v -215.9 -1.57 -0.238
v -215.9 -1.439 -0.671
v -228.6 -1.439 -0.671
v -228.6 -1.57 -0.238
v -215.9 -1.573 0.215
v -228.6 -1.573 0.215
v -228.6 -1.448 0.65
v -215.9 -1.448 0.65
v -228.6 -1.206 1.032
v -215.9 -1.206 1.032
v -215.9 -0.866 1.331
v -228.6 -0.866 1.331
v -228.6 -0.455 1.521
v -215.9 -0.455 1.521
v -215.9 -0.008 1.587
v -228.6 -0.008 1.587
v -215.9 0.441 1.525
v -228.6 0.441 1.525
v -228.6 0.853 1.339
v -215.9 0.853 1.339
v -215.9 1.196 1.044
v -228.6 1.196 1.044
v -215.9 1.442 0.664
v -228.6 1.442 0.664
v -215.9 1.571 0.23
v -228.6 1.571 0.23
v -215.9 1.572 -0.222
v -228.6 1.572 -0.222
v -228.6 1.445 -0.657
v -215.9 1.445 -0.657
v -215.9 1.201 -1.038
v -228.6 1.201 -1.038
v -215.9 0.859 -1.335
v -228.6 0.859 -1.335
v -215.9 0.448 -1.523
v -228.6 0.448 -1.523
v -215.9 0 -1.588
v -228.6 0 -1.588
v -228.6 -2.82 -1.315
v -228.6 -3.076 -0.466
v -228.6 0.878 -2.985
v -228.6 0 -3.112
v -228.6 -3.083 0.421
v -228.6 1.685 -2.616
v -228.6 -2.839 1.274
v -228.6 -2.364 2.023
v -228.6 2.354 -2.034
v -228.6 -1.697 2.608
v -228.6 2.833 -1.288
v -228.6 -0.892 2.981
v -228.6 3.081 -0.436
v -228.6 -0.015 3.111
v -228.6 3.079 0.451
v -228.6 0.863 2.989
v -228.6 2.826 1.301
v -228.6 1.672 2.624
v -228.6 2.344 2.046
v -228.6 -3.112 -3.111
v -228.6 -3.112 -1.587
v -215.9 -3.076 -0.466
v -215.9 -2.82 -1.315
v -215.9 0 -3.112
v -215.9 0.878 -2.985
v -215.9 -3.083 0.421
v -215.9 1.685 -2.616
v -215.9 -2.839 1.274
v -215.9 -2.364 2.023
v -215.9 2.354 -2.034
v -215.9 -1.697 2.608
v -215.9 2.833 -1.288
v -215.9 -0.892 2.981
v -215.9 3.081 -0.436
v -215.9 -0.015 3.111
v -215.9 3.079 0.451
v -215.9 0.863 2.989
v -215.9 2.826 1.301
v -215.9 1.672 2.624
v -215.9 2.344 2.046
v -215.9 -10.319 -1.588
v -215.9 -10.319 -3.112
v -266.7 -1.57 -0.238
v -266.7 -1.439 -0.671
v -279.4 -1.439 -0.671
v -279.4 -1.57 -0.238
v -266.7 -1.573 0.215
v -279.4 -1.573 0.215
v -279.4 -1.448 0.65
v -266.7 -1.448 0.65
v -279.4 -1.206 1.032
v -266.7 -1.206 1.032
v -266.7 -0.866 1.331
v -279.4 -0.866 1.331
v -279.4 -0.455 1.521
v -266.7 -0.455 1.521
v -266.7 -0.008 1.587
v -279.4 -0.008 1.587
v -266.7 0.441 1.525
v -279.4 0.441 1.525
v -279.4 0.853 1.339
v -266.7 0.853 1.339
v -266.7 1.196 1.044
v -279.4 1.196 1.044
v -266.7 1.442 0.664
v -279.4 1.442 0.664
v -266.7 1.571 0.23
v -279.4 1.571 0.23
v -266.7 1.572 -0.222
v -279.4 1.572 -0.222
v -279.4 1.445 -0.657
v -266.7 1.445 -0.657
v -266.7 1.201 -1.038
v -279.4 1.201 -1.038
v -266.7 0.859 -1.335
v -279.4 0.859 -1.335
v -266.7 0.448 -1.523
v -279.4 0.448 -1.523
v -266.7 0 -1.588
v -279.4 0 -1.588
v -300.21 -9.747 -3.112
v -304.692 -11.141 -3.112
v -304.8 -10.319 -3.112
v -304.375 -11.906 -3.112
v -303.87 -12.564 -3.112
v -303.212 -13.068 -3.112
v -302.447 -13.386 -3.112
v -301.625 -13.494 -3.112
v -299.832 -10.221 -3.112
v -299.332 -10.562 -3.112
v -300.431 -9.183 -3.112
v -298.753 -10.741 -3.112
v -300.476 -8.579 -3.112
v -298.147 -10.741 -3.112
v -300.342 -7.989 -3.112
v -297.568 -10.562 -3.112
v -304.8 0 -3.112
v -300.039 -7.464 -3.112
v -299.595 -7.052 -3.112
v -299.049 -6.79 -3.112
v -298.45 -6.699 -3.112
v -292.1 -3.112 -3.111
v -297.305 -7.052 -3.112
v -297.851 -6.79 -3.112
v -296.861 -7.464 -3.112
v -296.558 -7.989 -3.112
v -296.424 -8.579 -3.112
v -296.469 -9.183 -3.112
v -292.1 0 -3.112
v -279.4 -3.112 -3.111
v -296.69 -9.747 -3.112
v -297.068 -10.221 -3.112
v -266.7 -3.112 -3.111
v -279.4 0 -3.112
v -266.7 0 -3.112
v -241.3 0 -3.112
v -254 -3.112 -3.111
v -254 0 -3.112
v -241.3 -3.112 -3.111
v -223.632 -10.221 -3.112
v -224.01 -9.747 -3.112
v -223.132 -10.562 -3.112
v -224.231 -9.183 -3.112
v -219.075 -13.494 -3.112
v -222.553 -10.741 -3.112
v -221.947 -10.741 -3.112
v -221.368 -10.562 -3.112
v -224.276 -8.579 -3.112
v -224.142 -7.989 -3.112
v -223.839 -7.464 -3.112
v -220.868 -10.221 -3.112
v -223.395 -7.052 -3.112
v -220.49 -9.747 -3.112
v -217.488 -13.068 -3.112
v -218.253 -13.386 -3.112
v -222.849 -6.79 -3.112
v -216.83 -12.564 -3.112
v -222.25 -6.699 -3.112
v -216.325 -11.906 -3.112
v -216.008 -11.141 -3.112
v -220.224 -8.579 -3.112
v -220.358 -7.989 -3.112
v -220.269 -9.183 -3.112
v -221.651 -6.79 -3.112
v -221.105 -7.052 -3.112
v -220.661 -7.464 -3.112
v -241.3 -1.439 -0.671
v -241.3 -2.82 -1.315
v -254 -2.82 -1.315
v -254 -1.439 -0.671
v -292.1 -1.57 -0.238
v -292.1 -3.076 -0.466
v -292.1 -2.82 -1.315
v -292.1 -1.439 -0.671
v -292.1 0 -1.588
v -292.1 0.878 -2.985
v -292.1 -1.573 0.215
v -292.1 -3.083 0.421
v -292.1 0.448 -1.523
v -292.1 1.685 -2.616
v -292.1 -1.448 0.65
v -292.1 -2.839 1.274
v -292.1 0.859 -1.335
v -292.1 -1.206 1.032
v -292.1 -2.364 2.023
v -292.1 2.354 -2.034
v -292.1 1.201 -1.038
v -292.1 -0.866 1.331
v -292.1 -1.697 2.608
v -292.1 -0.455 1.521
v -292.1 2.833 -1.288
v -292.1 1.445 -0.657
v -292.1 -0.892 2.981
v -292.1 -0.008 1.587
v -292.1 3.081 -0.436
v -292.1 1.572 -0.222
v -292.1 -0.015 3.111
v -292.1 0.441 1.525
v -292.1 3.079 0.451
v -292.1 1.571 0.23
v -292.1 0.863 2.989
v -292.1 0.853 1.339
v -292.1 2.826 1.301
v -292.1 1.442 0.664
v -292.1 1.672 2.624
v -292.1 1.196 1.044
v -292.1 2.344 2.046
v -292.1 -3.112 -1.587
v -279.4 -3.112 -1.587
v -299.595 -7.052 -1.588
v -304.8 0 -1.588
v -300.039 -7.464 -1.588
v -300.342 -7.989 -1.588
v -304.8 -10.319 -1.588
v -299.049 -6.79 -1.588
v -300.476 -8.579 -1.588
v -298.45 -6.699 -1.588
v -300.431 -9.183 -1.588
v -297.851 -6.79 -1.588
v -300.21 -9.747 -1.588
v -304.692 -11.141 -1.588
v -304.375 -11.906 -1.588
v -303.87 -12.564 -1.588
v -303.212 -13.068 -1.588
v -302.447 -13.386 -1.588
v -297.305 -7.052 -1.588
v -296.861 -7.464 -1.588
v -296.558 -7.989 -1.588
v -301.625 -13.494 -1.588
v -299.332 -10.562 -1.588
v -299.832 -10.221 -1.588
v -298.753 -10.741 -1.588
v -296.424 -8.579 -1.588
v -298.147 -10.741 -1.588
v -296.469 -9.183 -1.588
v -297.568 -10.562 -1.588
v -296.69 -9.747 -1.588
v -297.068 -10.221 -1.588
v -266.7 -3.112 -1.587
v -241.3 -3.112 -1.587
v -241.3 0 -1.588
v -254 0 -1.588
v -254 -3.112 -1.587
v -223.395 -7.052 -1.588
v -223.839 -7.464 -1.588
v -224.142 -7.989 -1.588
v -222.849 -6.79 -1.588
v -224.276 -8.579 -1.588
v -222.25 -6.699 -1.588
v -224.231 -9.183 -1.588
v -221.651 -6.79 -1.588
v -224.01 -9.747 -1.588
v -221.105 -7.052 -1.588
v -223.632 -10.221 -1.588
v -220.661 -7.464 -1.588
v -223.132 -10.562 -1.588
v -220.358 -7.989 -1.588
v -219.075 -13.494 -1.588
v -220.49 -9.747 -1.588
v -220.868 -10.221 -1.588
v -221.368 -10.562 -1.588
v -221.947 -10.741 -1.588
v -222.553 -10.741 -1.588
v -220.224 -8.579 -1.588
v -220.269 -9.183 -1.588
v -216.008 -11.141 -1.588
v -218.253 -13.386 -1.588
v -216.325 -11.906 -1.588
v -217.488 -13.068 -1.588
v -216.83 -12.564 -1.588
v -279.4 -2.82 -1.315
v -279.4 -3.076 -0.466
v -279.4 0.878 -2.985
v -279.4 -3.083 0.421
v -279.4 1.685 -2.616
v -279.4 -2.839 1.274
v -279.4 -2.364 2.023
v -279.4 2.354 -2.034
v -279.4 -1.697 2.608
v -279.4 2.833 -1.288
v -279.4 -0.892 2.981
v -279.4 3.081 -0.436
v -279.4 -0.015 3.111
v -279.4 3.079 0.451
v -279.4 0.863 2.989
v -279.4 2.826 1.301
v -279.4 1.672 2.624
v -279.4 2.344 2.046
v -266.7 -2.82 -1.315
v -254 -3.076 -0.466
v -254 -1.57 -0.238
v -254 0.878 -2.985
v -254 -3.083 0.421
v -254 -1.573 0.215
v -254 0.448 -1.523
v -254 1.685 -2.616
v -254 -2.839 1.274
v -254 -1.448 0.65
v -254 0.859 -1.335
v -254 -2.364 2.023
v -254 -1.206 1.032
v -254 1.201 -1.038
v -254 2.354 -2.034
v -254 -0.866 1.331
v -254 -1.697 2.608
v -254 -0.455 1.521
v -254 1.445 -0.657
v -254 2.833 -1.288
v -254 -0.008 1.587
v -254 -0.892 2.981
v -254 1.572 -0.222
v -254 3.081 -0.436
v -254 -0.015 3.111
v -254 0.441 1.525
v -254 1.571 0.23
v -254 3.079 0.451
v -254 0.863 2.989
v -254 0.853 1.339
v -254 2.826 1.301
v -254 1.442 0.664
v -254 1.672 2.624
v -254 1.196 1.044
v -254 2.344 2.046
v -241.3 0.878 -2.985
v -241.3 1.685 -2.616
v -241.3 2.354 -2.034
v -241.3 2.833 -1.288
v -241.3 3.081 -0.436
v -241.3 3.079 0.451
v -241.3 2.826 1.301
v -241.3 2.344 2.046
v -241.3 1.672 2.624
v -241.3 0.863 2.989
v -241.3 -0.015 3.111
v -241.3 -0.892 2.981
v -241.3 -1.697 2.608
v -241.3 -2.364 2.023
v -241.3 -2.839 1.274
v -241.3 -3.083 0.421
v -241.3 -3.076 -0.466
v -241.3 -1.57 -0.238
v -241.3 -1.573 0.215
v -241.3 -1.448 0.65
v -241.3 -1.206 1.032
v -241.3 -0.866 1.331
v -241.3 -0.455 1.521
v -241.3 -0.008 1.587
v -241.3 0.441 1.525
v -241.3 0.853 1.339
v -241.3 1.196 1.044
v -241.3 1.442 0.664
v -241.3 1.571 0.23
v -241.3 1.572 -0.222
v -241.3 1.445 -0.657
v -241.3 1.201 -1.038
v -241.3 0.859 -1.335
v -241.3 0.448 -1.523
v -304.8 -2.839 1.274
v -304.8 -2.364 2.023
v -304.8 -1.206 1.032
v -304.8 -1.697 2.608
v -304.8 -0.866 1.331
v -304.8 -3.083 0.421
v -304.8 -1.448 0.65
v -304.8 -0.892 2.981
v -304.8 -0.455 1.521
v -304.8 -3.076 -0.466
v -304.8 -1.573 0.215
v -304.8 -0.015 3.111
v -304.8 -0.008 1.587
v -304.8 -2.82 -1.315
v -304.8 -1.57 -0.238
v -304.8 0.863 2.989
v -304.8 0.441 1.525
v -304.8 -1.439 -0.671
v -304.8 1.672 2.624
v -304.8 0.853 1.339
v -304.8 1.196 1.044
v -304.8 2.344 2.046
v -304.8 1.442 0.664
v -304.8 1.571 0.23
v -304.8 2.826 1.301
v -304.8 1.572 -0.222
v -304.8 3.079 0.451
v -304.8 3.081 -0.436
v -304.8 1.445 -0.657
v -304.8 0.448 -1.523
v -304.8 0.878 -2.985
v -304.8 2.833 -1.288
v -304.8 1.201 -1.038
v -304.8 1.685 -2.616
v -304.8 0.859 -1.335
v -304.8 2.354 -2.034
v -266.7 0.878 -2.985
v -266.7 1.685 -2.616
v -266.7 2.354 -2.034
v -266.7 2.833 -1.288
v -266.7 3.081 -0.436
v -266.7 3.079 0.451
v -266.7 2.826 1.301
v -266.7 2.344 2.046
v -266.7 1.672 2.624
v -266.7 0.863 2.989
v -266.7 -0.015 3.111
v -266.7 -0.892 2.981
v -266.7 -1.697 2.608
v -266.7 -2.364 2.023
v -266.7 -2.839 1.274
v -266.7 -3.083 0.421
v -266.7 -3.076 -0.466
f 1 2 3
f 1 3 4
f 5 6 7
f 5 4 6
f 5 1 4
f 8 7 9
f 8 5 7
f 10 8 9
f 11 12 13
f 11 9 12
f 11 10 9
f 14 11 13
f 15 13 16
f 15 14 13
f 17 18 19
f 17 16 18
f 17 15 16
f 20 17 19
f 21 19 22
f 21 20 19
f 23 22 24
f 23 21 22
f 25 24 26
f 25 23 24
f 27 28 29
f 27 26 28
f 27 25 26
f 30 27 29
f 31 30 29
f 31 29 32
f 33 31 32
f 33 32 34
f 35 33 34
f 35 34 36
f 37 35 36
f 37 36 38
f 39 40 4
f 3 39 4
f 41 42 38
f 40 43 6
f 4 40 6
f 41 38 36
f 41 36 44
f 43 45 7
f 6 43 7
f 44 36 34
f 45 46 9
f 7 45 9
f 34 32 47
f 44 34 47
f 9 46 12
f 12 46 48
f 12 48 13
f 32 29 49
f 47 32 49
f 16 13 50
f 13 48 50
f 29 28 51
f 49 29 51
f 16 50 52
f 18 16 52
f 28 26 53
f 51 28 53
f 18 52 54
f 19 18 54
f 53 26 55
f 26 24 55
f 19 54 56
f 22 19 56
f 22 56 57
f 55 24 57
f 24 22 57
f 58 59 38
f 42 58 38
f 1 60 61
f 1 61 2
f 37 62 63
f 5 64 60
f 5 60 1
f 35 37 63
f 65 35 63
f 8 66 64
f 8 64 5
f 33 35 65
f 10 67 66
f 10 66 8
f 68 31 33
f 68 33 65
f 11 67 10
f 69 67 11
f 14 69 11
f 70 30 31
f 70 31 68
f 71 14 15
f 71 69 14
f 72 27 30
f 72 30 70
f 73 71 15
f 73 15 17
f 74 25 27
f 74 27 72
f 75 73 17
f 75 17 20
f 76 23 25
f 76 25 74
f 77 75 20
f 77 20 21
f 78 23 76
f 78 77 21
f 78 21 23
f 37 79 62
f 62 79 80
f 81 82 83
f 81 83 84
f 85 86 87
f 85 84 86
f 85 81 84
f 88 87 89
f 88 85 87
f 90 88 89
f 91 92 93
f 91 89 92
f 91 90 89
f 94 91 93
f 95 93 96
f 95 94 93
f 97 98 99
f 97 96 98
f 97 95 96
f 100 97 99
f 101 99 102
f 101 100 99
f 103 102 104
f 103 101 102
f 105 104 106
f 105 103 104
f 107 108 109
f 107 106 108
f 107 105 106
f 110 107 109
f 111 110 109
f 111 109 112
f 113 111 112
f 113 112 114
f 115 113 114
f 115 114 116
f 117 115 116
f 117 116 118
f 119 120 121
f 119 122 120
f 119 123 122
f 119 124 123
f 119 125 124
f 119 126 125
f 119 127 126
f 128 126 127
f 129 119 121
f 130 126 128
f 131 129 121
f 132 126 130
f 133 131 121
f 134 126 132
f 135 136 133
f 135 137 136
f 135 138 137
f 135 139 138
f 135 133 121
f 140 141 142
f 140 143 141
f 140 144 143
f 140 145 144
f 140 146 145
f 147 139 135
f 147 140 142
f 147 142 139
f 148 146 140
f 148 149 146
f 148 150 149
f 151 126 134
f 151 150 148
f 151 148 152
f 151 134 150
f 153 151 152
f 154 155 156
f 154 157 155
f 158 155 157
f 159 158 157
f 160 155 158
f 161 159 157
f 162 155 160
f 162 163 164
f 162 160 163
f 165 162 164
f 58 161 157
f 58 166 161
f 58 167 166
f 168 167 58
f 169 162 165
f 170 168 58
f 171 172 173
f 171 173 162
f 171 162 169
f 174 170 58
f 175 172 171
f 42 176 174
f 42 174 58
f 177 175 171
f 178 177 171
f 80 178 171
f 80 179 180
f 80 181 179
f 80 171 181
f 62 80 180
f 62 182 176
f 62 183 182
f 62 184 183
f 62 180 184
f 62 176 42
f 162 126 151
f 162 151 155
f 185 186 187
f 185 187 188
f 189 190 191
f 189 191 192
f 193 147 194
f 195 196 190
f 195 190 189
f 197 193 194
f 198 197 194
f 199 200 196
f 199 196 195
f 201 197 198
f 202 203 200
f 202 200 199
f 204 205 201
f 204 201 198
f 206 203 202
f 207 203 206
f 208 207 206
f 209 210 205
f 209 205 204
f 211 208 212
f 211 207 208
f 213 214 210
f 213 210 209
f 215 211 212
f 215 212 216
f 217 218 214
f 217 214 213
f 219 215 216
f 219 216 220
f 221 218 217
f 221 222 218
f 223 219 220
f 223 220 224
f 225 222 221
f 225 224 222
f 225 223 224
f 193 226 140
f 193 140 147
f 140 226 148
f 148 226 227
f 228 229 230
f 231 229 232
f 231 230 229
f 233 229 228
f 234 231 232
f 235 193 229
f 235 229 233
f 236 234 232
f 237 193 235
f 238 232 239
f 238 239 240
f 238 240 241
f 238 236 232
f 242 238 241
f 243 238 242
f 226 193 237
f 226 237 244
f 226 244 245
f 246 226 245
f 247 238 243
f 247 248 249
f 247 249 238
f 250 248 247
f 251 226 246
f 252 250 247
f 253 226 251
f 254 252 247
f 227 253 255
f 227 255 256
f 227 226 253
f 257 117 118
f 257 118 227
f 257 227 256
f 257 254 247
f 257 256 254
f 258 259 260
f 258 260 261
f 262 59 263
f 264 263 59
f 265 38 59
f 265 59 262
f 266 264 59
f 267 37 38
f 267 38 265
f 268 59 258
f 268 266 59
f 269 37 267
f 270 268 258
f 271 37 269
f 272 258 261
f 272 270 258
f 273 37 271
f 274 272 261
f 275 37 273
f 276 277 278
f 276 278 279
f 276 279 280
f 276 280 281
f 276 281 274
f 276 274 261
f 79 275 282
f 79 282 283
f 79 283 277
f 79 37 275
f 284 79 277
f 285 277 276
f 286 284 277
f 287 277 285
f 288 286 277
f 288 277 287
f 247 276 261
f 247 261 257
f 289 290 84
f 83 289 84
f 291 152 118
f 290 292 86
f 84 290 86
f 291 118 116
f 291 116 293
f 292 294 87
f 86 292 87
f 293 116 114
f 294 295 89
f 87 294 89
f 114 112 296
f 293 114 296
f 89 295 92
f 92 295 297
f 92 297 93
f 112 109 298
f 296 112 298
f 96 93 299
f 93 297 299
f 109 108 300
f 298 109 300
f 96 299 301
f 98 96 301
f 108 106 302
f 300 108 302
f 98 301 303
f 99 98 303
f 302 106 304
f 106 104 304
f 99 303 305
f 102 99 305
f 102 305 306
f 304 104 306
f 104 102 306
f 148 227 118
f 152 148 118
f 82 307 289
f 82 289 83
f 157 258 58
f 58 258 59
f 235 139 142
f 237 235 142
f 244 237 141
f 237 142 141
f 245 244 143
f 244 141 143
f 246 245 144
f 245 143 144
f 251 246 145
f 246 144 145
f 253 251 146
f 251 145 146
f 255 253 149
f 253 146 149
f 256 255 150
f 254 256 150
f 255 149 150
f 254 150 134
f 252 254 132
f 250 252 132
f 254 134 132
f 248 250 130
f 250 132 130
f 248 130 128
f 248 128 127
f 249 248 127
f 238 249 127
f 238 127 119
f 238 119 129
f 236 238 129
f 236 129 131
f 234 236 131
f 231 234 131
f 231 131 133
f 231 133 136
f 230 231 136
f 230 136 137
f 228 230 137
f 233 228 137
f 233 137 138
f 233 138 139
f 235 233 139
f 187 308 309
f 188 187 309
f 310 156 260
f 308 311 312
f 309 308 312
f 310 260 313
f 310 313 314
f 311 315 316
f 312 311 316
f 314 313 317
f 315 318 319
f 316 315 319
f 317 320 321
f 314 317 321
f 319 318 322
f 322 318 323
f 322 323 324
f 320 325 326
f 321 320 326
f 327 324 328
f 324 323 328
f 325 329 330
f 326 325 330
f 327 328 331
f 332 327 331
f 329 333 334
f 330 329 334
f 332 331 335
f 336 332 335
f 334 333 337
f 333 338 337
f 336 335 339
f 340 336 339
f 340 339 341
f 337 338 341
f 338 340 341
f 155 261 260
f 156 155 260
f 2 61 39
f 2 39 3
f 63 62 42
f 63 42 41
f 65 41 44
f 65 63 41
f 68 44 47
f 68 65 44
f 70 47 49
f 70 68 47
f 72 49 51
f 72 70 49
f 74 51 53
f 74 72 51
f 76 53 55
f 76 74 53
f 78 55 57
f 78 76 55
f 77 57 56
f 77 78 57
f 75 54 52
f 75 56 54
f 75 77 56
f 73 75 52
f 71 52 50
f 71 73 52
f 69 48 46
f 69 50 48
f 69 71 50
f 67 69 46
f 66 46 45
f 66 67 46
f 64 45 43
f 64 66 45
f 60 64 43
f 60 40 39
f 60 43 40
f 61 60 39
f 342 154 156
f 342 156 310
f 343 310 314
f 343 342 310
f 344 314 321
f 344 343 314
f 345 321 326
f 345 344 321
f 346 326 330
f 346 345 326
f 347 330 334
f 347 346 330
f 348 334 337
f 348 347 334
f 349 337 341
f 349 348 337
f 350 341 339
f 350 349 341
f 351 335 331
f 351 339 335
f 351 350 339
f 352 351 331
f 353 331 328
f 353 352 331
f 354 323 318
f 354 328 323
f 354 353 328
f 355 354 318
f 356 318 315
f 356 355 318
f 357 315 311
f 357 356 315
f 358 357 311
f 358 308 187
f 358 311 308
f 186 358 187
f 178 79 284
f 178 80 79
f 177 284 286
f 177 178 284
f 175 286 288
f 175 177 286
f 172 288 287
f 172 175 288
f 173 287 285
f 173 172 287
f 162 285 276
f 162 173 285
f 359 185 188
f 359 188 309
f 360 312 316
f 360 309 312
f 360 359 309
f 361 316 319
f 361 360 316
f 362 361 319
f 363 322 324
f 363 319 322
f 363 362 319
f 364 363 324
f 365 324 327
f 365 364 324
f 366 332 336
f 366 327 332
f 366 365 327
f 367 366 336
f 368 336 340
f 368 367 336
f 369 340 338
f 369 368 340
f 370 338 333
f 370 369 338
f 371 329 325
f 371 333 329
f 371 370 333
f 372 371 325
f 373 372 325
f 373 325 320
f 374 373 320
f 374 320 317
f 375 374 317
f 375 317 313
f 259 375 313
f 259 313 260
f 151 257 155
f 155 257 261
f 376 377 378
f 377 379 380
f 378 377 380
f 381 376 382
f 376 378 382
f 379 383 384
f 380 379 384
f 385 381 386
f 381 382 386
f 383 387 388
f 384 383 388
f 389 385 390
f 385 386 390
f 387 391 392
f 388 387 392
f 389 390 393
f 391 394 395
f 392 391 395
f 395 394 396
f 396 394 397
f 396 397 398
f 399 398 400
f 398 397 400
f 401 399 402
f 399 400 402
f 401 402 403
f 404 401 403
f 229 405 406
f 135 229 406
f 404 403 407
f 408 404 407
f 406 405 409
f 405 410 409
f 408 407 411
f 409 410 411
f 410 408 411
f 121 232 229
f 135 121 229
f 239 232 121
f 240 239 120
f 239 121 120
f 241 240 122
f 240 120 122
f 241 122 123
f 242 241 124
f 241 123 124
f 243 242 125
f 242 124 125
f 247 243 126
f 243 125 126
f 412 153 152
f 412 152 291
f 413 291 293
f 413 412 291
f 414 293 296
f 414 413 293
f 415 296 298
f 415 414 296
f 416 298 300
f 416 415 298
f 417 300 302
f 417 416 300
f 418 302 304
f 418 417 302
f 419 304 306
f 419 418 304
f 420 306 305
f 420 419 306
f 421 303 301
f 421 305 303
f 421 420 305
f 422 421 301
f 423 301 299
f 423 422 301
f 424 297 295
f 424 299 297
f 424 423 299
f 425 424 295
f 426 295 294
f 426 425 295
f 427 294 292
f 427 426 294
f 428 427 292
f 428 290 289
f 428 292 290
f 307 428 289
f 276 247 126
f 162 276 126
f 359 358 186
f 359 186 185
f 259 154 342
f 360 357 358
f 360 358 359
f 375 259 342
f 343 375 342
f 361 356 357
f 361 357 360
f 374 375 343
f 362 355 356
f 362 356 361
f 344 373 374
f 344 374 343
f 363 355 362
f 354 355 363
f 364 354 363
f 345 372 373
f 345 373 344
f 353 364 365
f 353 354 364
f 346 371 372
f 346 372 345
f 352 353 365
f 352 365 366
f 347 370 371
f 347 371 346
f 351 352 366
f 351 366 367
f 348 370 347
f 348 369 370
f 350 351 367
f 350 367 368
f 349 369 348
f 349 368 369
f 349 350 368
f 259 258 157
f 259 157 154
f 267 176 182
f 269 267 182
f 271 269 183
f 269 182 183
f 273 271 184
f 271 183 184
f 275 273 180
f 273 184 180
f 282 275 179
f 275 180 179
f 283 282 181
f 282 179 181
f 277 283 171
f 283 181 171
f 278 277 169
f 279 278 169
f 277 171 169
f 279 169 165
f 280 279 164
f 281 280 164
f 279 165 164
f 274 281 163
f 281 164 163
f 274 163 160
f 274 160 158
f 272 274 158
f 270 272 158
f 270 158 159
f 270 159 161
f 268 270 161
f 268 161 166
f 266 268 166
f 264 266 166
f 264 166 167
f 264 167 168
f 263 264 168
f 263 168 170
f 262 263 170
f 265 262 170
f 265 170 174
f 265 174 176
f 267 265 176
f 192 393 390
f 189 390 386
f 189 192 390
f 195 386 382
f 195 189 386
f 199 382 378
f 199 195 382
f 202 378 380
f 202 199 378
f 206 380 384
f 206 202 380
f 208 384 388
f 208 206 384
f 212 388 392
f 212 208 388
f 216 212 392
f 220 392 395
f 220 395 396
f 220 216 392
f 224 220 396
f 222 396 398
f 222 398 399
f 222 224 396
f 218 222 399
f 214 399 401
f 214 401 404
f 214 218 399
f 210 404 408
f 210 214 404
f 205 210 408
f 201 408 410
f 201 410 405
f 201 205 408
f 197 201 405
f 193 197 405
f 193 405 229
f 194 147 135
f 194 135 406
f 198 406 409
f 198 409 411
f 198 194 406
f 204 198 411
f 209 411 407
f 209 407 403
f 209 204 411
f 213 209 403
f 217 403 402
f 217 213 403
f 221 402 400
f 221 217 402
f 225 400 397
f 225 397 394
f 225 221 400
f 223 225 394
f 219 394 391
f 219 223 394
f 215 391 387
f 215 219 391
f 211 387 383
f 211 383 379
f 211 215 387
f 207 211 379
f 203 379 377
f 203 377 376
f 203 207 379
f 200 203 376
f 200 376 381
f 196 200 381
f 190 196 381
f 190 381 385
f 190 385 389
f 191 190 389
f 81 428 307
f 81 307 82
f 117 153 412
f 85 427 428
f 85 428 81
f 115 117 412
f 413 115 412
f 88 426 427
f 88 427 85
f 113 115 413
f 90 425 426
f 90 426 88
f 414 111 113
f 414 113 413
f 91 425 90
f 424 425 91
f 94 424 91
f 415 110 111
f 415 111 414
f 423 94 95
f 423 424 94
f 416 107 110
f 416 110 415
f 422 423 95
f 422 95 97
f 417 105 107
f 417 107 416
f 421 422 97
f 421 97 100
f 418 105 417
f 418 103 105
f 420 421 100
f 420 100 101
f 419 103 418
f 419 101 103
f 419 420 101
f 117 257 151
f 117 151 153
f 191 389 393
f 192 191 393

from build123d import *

# Parameters (mm, degrees)
BOSS_EXTRUDE1_DEPTH = 304.8
SKETCH4_W           = 12.7
SKETCH4_H           = 6.223
CUT_EXTRUDE1_DEPTH  = 306.114409233
LPATTERN1_COUNT     = 24
LPATTERN1_PITCH     = 25.4
BOSS_EXTRUDE2_DEPTH = 609.6
SKETCH6_W           = 12.7
SKETCH6_H           = 6.223
CUT_EXTRUDE2_DEPTH  = 306.114409233
LPATTERN2_COUNT     = 24
LPATTERN2_PITCH     = 25.4
SKETCH7_R           = 1.5875
BOSS_EXTRUDE3_DEPTH = 609.6
CHAMFER1_SIZE       = 0.3175
CUT_EXTRUDE3_START  = -88.9
SKETCH8_W           = 11.762471384
SKETCH8_H           = 30.066276354
CUT_EXTRUDE3_DEPTH  = 521.857265411
FILLET1_R           = 3.175
SKETCH9_R           = 2.032
CUT_EXTRUDE4_DEPTH  = 306.162001268


with BuildPart() as part:
    # Sketch3 → Boss-Extrude1 (new, symmetric)
    with BuildSketch(Plane(origin=(0, 0, 0), x_dir=(0, 0, -1), z_dir=(1, 0, 0))):
        with BuildLine():
            Line((1.5875, 0), (1.5875, -2.676056053))
            Line((1.5875, -2.676056053), (1.5875, -13.49375))
            Line((1.5875, -13.49375), (3.1115, -13.49375))
            Line((3.1115, -13.49375), (3.1115, 0))
            ThreePointArc((3.1115, 0), (-2.624212484, 1.671807731), (1.314976721, -2.819976679))
            Line((1.314976721, -2.819976679), (0.670906491, -1.438763612))
            ThreePointArc((0.670906491, -1.438763612), (-1.33888392, 0.852963128), (1.5875, 0))
        make_face()
    extrude(amount=BOSS_EXTRUDE1_DEPTH, both=True)

    # Sketch4 → Cut-Extrude1 (cut, symmetric)
    with BuildSketch(Plane.XY):
        with Locations((298.45, 0)):
            Rectangle(SKETCH4_W, SKETCH4_H)
    cut_extrude1 = extrude(amount=CUT_EXTRUDE1_DEPTH, both=True, mode=Mode.SUBTRACT)

    # LPattern1: Cut-Extrude1 ×24
    with Locations(*[(-i * LPATTERN1_PITCH, 0, 0) for i in range(1, LPATTERN1_COUNT)]):
        add(cut_extrude1, mode=Mode.SUBTRACT)


with BuildPart() as body_2:
    # Sketch5 → Boss-Extrude2 (new body)
    with BuildSketch(Plane(origin=(304.8, 0, 0), x_dir=(0, 0, -1), z_dir=(1, 0, 0))):
        with BuildLine():
            Line((1.5875, 13.49375), (1.5875, 2.676056053))
            Line((1.5875, 2.676056053), (1.5875, 0))
            ThreePointArc((1.5875, 0), (-1.33888392, -0.852963128), (0.670906491, 1.438763612))
            Line((0.670906491, 1.438763612), (1.314976721, 2.819976679))
            ThreePointArc((1.314976721, 2.819976679), (-2.624212484, -1.671807731), (3.1115, 0))
            Line((3.1115, 0), (3.1115, 13.49375))
            Line((3.1115, 13.49375), (1.5875, 13.49375))
        make_face()
    extrude(amount=-BOSS_EXTRUDE2_DEPTH)

    # Sketch6 → Cut-Extrude2 (cut, symmetric)
    with BuildSketch(Plane.XY):
        with Locations((285.75, 0)):
            Rectangle(SKETCH6_W, SKETCH6_H)
    cut_extrude2 = extrude(amount=CUT_EXTRUDE2_DEPTH, both=True, mode=Mode.SUBTRACT)

    # LPattern2: Cut-Extrude2 ×24
    with Locations(*[(-i * LPATTERN2_PITCH, 0, 0) for i in range(1, LPATTERN2_COUNT)]):
        add(cut_extrude2, mode=Mode.SUBTRACT)


with BuildPart() as body_3:
    # Sketch7 → Boss-Extrude3 (new body)
    with BuildSketch(Plane(origin=(304.8, 0, 0), x_dir=(0, 0, -1), z_dir=(1, 0, 0))):
        Circle(SKETCH7_R)
    extrude(amount=-BOSS_EXTRUDE3_DEPTH)

    # Chamfer1
    chamfer1_edges = [body_3.edges().sort_by_distance(p)[0] for p in [
        (304.8, 0, 1.5875),
        (-304.8, 0, 1.5875),
    ]]
    chamfer(chamfer1_edges, length=CHAMFER1_SIZE)


with BuildPart() as cut_extrude3_tool:
    # Sketch8 → Cut-Extrude3 (new, through all)
    with BuildSketch(Plane.ZY.offset(304.8).offset(CUT_EXTRUDE3_START)):
        Rectangle(SKETCH8_W, SKETCH8_H)
    extrude(amount=-CUT_EXTRUDE3_DEPTH)


with BuildPart() as part_1:
    add(part.part)

    # Cut-Extrude3: cut by cut_extrude3_tool
    add(cut_extrude3_tool.part, mode=Mode.SUBTRACT)

    # Fillet1
    fillet1_edges = [part_1.edges().sort_by_distance(p)[0] for p in [
        (-215.9, -13.49375, -2.3495),
        (-304.8, -13.49375, -2.3495),
    ]]
    fillet(fillet1_edges, radius=FILLET1_R)

    # Sketch9 → Cut-Extrude4 (cut, through all)
    with BuildSketch(Plane(origin=(0, 0, -3.1115), x_dir=(-1, 0, 0), z_dir=(0, 0, -1))):
        with Locations(Location((222.25, -8.73125, 0), (0, 0, 90))):
            Circle(SKETCH9_R)
        with Locations(Location((298.45, -8.73125, 0), (0, 0, 90))):
            Circle(SKETCH9_R)
    extrude(amount=-CUT_EXTRUDE4_DEPTH, mode=Mode.SUBTRACT)


with BuildPart() as body_2_1:
    add(body_2.part)

    # Cut-Extrude3: cut by cut_extrude3_tool
    add(cut_extrude3_tool.part, mode=Mode.SUBTRACT)


with BuildPart() as body_3_1:
    add(body_3.part)

    # Cut-Extrude3: cut by cut_extrude3_tool
    add(cut_extrude3_tool.part, mode=Mode.SUBTRACT)


solid = part_1.part
